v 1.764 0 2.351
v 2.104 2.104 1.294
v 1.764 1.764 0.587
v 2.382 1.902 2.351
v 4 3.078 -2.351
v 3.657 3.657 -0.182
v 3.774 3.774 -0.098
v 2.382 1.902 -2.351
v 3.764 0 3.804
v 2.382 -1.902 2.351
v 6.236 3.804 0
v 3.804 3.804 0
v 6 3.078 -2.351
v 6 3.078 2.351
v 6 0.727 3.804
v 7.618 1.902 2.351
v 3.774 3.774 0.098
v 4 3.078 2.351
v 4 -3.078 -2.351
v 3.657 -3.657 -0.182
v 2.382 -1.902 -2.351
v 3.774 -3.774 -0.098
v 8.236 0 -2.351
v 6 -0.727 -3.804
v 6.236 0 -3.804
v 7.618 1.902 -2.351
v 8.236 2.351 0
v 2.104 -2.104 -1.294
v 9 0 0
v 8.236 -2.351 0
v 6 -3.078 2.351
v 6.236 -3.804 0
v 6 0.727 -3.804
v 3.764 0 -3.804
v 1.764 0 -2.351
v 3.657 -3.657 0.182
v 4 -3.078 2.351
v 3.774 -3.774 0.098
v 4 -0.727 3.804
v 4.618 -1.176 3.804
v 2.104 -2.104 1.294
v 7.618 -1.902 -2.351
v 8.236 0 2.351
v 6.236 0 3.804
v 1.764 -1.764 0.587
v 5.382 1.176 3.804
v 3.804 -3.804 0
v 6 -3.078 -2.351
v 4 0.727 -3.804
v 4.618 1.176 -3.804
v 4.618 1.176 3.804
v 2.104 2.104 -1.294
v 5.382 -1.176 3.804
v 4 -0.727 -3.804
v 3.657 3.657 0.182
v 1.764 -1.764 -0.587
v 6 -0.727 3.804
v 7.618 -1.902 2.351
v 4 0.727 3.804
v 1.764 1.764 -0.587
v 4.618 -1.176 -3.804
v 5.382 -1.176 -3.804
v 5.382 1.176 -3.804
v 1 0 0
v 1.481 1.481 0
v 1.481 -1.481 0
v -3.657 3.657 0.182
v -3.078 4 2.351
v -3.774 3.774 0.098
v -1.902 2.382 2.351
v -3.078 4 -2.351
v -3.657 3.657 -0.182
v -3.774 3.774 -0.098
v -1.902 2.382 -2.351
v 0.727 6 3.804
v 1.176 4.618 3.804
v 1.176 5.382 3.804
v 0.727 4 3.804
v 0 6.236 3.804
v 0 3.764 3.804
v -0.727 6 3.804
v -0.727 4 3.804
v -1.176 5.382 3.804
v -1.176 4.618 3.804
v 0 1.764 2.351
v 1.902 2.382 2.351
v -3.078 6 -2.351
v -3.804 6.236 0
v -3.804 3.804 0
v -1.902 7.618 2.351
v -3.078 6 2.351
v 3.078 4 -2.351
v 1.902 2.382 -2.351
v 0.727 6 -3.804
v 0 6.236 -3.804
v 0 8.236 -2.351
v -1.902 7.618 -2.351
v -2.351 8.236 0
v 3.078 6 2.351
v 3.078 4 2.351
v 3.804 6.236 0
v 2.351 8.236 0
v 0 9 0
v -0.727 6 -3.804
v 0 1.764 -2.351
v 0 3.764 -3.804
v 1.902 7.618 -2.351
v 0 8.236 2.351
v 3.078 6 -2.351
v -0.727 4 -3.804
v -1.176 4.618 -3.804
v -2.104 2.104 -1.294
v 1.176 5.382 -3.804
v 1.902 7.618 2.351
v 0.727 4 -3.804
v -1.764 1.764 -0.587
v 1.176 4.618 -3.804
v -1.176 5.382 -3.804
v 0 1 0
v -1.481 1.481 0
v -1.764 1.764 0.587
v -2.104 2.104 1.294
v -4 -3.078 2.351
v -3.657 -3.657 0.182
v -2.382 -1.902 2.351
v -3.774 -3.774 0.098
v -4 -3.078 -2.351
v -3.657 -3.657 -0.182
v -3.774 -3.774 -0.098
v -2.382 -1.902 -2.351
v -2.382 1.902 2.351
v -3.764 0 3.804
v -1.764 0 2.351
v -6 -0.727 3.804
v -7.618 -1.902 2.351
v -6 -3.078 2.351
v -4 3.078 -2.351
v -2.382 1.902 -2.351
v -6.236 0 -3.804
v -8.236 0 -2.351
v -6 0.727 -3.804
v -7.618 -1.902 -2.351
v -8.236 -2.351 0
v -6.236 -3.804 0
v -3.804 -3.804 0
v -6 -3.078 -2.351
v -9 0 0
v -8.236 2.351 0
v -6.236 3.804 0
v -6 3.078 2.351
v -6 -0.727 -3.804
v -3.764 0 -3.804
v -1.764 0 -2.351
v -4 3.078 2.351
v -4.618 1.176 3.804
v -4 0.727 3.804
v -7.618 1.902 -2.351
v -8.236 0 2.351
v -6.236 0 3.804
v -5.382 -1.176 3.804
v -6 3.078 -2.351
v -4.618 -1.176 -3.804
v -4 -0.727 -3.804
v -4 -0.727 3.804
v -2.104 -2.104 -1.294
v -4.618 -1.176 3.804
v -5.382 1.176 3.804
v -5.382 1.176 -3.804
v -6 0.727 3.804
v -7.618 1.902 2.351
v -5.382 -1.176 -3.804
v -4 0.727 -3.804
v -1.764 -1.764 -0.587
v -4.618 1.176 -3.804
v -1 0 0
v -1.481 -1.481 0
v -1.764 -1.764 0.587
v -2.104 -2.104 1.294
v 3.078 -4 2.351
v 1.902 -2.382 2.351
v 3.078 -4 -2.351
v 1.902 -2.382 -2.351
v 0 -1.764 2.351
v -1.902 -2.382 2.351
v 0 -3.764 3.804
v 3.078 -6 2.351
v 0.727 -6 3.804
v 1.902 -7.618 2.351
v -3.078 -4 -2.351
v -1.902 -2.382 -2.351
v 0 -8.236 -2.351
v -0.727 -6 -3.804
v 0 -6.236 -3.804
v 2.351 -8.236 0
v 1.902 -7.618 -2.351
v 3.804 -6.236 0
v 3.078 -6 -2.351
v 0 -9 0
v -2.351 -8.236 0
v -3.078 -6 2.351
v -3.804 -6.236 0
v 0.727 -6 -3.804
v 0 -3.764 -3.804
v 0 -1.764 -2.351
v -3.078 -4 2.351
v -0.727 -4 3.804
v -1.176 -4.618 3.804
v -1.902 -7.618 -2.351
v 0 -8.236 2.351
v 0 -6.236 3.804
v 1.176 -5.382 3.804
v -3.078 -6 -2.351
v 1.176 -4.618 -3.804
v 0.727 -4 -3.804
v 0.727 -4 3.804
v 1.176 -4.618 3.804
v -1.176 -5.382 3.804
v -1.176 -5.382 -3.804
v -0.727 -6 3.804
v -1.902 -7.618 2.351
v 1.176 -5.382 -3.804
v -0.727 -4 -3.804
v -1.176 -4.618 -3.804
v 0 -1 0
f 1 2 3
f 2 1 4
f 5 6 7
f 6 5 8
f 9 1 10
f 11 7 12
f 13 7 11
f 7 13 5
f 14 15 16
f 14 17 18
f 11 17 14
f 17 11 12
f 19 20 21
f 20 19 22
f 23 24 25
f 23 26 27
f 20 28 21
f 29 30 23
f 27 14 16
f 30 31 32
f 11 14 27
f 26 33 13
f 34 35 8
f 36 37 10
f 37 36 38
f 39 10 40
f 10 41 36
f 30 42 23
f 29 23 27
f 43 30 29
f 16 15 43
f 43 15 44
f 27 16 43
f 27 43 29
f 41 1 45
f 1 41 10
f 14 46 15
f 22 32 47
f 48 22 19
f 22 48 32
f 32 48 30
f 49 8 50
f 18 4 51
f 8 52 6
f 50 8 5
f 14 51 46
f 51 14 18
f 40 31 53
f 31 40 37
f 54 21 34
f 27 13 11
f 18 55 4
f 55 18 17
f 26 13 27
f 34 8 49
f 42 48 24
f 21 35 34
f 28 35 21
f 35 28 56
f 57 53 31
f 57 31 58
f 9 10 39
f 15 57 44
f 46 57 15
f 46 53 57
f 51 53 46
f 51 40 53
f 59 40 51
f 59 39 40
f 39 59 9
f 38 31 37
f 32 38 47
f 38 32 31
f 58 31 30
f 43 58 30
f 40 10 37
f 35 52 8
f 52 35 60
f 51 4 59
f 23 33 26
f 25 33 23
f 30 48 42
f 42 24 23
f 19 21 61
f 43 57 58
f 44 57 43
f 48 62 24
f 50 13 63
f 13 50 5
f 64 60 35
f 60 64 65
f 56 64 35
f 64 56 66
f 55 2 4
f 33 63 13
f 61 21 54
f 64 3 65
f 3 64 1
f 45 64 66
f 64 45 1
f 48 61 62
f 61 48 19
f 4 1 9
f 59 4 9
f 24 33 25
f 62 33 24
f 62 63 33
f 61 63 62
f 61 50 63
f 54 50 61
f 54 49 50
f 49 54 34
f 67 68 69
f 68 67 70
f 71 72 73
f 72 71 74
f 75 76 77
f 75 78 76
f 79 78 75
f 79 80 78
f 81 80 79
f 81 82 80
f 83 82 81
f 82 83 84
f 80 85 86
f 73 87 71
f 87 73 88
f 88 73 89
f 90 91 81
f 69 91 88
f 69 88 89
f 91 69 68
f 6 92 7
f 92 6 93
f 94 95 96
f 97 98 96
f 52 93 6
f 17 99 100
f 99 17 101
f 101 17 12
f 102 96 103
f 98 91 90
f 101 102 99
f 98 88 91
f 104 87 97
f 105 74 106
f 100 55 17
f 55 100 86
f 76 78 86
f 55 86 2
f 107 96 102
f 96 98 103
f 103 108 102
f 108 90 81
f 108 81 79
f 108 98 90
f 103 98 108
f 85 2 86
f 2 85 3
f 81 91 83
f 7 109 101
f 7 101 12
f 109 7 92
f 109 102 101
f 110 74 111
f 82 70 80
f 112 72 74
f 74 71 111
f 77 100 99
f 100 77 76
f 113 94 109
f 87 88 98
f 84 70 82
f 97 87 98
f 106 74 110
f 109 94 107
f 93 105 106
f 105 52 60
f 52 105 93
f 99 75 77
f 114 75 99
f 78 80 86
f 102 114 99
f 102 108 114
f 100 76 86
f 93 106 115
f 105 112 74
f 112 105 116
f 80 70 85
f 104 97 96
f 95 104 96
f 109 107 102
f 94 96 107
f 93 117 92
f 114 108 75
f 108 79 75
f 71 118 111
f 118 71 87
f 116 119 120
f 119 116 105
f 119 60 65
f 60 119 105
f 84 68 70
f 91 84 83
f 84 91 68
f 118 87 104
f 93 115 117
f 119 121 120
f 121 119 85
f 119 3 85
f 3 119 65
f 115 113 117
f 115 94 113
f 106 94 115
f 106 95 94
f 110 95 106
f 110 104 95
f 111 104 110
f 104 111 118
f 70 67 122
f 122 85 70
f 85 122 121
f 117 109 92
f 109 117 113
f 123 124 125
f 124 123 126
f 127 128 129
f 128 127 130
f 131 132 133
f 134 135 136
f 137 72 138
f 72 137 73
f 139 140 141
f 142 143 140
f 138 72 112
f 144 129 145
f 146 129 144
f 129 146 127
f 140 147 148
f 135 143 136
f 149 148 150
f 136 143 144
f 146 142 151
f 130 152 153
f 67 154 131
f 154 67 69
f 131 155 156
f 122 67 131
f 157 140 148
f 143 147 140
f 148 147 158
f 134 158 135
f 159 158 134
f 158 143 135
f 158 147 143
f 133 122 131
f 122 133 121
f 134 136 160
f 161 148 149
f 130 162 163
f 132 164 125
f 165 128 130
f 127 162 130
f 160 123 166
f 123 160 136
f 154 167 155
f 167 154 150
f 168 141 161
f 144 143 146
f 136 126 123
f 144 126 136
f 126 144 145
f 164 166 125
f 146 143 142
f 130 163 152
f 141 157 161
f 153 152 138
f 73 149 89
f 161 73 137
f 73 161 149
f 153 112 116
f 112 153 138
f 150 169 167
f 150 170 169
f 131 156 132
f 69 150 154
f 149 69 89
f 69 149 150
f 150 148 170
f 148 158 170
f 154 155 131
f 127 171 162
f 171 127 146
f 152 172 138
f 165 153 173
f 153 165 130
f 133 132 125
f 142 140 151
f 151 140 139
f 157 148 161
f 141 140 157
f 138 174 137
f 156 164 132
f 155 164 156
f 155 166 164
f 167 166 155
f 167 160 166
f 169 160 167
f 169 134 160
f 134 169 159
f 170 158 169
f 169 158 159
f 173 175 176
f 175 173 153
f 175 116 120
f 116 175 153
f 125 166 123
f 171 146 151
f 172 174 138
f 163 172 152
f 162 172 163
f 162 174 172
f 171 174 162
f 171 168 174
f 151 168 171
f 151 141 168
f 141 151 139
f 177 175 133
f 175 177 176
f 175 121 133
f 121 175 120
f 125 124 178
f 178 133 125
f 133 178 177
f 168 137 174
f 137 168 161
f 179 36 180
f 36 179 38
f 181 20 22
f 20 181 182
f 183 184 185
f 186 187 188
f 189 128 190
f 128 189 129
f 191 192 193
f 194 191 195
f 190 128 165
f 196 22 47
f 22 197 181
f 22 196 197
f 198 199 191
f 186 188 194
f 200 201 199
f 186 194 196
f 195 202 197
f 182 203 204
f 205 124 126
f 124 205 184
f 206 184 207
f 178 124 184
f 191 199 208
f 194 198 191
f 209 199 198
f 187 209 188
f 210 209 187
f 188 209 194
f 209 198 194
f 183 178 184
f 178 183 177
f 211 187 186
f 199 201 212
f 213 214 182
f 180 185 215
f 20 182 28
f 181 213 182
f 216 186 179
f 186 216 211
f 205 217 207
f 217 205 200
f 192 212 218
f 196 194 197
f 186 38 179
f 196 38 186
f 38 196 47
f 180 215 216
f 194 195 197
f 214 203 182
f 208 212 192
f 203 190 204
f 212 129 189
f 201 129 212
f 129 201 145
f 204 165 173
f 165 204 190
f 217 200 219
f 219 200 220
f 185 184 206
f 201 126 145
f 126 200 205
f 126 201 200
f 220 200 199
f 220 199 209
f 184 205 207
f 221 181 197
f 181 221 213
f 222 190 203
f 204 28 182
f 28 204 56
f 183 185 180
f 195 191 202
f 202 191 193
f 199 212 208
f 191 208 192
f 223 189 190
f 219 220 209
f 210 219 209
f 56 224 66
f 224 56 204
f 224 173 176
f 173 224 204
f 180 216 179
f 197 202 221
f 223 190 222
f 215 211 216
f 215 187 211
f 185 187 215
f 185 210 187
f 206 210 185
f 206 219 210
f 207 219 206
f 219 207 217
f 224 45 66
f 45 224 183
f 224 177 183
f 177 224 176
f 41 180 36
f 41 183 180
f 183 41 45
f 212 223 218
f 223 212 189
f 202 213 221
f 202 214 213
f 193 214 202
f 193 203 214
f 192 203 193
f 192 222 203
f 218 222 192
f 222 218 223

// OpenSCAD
// Test for loops with step values 0, 90, 180, 270
// Spheres are large enough (r=4) relative to circle radius (5) that
// adjacent ones overlap, forming a single connected solid.
$fn=10;

for (angle = [0:90:270]) {
    rotate([0, 0, angle])
    translate([5, 0, 0])
    sphere(r = 4);
}
